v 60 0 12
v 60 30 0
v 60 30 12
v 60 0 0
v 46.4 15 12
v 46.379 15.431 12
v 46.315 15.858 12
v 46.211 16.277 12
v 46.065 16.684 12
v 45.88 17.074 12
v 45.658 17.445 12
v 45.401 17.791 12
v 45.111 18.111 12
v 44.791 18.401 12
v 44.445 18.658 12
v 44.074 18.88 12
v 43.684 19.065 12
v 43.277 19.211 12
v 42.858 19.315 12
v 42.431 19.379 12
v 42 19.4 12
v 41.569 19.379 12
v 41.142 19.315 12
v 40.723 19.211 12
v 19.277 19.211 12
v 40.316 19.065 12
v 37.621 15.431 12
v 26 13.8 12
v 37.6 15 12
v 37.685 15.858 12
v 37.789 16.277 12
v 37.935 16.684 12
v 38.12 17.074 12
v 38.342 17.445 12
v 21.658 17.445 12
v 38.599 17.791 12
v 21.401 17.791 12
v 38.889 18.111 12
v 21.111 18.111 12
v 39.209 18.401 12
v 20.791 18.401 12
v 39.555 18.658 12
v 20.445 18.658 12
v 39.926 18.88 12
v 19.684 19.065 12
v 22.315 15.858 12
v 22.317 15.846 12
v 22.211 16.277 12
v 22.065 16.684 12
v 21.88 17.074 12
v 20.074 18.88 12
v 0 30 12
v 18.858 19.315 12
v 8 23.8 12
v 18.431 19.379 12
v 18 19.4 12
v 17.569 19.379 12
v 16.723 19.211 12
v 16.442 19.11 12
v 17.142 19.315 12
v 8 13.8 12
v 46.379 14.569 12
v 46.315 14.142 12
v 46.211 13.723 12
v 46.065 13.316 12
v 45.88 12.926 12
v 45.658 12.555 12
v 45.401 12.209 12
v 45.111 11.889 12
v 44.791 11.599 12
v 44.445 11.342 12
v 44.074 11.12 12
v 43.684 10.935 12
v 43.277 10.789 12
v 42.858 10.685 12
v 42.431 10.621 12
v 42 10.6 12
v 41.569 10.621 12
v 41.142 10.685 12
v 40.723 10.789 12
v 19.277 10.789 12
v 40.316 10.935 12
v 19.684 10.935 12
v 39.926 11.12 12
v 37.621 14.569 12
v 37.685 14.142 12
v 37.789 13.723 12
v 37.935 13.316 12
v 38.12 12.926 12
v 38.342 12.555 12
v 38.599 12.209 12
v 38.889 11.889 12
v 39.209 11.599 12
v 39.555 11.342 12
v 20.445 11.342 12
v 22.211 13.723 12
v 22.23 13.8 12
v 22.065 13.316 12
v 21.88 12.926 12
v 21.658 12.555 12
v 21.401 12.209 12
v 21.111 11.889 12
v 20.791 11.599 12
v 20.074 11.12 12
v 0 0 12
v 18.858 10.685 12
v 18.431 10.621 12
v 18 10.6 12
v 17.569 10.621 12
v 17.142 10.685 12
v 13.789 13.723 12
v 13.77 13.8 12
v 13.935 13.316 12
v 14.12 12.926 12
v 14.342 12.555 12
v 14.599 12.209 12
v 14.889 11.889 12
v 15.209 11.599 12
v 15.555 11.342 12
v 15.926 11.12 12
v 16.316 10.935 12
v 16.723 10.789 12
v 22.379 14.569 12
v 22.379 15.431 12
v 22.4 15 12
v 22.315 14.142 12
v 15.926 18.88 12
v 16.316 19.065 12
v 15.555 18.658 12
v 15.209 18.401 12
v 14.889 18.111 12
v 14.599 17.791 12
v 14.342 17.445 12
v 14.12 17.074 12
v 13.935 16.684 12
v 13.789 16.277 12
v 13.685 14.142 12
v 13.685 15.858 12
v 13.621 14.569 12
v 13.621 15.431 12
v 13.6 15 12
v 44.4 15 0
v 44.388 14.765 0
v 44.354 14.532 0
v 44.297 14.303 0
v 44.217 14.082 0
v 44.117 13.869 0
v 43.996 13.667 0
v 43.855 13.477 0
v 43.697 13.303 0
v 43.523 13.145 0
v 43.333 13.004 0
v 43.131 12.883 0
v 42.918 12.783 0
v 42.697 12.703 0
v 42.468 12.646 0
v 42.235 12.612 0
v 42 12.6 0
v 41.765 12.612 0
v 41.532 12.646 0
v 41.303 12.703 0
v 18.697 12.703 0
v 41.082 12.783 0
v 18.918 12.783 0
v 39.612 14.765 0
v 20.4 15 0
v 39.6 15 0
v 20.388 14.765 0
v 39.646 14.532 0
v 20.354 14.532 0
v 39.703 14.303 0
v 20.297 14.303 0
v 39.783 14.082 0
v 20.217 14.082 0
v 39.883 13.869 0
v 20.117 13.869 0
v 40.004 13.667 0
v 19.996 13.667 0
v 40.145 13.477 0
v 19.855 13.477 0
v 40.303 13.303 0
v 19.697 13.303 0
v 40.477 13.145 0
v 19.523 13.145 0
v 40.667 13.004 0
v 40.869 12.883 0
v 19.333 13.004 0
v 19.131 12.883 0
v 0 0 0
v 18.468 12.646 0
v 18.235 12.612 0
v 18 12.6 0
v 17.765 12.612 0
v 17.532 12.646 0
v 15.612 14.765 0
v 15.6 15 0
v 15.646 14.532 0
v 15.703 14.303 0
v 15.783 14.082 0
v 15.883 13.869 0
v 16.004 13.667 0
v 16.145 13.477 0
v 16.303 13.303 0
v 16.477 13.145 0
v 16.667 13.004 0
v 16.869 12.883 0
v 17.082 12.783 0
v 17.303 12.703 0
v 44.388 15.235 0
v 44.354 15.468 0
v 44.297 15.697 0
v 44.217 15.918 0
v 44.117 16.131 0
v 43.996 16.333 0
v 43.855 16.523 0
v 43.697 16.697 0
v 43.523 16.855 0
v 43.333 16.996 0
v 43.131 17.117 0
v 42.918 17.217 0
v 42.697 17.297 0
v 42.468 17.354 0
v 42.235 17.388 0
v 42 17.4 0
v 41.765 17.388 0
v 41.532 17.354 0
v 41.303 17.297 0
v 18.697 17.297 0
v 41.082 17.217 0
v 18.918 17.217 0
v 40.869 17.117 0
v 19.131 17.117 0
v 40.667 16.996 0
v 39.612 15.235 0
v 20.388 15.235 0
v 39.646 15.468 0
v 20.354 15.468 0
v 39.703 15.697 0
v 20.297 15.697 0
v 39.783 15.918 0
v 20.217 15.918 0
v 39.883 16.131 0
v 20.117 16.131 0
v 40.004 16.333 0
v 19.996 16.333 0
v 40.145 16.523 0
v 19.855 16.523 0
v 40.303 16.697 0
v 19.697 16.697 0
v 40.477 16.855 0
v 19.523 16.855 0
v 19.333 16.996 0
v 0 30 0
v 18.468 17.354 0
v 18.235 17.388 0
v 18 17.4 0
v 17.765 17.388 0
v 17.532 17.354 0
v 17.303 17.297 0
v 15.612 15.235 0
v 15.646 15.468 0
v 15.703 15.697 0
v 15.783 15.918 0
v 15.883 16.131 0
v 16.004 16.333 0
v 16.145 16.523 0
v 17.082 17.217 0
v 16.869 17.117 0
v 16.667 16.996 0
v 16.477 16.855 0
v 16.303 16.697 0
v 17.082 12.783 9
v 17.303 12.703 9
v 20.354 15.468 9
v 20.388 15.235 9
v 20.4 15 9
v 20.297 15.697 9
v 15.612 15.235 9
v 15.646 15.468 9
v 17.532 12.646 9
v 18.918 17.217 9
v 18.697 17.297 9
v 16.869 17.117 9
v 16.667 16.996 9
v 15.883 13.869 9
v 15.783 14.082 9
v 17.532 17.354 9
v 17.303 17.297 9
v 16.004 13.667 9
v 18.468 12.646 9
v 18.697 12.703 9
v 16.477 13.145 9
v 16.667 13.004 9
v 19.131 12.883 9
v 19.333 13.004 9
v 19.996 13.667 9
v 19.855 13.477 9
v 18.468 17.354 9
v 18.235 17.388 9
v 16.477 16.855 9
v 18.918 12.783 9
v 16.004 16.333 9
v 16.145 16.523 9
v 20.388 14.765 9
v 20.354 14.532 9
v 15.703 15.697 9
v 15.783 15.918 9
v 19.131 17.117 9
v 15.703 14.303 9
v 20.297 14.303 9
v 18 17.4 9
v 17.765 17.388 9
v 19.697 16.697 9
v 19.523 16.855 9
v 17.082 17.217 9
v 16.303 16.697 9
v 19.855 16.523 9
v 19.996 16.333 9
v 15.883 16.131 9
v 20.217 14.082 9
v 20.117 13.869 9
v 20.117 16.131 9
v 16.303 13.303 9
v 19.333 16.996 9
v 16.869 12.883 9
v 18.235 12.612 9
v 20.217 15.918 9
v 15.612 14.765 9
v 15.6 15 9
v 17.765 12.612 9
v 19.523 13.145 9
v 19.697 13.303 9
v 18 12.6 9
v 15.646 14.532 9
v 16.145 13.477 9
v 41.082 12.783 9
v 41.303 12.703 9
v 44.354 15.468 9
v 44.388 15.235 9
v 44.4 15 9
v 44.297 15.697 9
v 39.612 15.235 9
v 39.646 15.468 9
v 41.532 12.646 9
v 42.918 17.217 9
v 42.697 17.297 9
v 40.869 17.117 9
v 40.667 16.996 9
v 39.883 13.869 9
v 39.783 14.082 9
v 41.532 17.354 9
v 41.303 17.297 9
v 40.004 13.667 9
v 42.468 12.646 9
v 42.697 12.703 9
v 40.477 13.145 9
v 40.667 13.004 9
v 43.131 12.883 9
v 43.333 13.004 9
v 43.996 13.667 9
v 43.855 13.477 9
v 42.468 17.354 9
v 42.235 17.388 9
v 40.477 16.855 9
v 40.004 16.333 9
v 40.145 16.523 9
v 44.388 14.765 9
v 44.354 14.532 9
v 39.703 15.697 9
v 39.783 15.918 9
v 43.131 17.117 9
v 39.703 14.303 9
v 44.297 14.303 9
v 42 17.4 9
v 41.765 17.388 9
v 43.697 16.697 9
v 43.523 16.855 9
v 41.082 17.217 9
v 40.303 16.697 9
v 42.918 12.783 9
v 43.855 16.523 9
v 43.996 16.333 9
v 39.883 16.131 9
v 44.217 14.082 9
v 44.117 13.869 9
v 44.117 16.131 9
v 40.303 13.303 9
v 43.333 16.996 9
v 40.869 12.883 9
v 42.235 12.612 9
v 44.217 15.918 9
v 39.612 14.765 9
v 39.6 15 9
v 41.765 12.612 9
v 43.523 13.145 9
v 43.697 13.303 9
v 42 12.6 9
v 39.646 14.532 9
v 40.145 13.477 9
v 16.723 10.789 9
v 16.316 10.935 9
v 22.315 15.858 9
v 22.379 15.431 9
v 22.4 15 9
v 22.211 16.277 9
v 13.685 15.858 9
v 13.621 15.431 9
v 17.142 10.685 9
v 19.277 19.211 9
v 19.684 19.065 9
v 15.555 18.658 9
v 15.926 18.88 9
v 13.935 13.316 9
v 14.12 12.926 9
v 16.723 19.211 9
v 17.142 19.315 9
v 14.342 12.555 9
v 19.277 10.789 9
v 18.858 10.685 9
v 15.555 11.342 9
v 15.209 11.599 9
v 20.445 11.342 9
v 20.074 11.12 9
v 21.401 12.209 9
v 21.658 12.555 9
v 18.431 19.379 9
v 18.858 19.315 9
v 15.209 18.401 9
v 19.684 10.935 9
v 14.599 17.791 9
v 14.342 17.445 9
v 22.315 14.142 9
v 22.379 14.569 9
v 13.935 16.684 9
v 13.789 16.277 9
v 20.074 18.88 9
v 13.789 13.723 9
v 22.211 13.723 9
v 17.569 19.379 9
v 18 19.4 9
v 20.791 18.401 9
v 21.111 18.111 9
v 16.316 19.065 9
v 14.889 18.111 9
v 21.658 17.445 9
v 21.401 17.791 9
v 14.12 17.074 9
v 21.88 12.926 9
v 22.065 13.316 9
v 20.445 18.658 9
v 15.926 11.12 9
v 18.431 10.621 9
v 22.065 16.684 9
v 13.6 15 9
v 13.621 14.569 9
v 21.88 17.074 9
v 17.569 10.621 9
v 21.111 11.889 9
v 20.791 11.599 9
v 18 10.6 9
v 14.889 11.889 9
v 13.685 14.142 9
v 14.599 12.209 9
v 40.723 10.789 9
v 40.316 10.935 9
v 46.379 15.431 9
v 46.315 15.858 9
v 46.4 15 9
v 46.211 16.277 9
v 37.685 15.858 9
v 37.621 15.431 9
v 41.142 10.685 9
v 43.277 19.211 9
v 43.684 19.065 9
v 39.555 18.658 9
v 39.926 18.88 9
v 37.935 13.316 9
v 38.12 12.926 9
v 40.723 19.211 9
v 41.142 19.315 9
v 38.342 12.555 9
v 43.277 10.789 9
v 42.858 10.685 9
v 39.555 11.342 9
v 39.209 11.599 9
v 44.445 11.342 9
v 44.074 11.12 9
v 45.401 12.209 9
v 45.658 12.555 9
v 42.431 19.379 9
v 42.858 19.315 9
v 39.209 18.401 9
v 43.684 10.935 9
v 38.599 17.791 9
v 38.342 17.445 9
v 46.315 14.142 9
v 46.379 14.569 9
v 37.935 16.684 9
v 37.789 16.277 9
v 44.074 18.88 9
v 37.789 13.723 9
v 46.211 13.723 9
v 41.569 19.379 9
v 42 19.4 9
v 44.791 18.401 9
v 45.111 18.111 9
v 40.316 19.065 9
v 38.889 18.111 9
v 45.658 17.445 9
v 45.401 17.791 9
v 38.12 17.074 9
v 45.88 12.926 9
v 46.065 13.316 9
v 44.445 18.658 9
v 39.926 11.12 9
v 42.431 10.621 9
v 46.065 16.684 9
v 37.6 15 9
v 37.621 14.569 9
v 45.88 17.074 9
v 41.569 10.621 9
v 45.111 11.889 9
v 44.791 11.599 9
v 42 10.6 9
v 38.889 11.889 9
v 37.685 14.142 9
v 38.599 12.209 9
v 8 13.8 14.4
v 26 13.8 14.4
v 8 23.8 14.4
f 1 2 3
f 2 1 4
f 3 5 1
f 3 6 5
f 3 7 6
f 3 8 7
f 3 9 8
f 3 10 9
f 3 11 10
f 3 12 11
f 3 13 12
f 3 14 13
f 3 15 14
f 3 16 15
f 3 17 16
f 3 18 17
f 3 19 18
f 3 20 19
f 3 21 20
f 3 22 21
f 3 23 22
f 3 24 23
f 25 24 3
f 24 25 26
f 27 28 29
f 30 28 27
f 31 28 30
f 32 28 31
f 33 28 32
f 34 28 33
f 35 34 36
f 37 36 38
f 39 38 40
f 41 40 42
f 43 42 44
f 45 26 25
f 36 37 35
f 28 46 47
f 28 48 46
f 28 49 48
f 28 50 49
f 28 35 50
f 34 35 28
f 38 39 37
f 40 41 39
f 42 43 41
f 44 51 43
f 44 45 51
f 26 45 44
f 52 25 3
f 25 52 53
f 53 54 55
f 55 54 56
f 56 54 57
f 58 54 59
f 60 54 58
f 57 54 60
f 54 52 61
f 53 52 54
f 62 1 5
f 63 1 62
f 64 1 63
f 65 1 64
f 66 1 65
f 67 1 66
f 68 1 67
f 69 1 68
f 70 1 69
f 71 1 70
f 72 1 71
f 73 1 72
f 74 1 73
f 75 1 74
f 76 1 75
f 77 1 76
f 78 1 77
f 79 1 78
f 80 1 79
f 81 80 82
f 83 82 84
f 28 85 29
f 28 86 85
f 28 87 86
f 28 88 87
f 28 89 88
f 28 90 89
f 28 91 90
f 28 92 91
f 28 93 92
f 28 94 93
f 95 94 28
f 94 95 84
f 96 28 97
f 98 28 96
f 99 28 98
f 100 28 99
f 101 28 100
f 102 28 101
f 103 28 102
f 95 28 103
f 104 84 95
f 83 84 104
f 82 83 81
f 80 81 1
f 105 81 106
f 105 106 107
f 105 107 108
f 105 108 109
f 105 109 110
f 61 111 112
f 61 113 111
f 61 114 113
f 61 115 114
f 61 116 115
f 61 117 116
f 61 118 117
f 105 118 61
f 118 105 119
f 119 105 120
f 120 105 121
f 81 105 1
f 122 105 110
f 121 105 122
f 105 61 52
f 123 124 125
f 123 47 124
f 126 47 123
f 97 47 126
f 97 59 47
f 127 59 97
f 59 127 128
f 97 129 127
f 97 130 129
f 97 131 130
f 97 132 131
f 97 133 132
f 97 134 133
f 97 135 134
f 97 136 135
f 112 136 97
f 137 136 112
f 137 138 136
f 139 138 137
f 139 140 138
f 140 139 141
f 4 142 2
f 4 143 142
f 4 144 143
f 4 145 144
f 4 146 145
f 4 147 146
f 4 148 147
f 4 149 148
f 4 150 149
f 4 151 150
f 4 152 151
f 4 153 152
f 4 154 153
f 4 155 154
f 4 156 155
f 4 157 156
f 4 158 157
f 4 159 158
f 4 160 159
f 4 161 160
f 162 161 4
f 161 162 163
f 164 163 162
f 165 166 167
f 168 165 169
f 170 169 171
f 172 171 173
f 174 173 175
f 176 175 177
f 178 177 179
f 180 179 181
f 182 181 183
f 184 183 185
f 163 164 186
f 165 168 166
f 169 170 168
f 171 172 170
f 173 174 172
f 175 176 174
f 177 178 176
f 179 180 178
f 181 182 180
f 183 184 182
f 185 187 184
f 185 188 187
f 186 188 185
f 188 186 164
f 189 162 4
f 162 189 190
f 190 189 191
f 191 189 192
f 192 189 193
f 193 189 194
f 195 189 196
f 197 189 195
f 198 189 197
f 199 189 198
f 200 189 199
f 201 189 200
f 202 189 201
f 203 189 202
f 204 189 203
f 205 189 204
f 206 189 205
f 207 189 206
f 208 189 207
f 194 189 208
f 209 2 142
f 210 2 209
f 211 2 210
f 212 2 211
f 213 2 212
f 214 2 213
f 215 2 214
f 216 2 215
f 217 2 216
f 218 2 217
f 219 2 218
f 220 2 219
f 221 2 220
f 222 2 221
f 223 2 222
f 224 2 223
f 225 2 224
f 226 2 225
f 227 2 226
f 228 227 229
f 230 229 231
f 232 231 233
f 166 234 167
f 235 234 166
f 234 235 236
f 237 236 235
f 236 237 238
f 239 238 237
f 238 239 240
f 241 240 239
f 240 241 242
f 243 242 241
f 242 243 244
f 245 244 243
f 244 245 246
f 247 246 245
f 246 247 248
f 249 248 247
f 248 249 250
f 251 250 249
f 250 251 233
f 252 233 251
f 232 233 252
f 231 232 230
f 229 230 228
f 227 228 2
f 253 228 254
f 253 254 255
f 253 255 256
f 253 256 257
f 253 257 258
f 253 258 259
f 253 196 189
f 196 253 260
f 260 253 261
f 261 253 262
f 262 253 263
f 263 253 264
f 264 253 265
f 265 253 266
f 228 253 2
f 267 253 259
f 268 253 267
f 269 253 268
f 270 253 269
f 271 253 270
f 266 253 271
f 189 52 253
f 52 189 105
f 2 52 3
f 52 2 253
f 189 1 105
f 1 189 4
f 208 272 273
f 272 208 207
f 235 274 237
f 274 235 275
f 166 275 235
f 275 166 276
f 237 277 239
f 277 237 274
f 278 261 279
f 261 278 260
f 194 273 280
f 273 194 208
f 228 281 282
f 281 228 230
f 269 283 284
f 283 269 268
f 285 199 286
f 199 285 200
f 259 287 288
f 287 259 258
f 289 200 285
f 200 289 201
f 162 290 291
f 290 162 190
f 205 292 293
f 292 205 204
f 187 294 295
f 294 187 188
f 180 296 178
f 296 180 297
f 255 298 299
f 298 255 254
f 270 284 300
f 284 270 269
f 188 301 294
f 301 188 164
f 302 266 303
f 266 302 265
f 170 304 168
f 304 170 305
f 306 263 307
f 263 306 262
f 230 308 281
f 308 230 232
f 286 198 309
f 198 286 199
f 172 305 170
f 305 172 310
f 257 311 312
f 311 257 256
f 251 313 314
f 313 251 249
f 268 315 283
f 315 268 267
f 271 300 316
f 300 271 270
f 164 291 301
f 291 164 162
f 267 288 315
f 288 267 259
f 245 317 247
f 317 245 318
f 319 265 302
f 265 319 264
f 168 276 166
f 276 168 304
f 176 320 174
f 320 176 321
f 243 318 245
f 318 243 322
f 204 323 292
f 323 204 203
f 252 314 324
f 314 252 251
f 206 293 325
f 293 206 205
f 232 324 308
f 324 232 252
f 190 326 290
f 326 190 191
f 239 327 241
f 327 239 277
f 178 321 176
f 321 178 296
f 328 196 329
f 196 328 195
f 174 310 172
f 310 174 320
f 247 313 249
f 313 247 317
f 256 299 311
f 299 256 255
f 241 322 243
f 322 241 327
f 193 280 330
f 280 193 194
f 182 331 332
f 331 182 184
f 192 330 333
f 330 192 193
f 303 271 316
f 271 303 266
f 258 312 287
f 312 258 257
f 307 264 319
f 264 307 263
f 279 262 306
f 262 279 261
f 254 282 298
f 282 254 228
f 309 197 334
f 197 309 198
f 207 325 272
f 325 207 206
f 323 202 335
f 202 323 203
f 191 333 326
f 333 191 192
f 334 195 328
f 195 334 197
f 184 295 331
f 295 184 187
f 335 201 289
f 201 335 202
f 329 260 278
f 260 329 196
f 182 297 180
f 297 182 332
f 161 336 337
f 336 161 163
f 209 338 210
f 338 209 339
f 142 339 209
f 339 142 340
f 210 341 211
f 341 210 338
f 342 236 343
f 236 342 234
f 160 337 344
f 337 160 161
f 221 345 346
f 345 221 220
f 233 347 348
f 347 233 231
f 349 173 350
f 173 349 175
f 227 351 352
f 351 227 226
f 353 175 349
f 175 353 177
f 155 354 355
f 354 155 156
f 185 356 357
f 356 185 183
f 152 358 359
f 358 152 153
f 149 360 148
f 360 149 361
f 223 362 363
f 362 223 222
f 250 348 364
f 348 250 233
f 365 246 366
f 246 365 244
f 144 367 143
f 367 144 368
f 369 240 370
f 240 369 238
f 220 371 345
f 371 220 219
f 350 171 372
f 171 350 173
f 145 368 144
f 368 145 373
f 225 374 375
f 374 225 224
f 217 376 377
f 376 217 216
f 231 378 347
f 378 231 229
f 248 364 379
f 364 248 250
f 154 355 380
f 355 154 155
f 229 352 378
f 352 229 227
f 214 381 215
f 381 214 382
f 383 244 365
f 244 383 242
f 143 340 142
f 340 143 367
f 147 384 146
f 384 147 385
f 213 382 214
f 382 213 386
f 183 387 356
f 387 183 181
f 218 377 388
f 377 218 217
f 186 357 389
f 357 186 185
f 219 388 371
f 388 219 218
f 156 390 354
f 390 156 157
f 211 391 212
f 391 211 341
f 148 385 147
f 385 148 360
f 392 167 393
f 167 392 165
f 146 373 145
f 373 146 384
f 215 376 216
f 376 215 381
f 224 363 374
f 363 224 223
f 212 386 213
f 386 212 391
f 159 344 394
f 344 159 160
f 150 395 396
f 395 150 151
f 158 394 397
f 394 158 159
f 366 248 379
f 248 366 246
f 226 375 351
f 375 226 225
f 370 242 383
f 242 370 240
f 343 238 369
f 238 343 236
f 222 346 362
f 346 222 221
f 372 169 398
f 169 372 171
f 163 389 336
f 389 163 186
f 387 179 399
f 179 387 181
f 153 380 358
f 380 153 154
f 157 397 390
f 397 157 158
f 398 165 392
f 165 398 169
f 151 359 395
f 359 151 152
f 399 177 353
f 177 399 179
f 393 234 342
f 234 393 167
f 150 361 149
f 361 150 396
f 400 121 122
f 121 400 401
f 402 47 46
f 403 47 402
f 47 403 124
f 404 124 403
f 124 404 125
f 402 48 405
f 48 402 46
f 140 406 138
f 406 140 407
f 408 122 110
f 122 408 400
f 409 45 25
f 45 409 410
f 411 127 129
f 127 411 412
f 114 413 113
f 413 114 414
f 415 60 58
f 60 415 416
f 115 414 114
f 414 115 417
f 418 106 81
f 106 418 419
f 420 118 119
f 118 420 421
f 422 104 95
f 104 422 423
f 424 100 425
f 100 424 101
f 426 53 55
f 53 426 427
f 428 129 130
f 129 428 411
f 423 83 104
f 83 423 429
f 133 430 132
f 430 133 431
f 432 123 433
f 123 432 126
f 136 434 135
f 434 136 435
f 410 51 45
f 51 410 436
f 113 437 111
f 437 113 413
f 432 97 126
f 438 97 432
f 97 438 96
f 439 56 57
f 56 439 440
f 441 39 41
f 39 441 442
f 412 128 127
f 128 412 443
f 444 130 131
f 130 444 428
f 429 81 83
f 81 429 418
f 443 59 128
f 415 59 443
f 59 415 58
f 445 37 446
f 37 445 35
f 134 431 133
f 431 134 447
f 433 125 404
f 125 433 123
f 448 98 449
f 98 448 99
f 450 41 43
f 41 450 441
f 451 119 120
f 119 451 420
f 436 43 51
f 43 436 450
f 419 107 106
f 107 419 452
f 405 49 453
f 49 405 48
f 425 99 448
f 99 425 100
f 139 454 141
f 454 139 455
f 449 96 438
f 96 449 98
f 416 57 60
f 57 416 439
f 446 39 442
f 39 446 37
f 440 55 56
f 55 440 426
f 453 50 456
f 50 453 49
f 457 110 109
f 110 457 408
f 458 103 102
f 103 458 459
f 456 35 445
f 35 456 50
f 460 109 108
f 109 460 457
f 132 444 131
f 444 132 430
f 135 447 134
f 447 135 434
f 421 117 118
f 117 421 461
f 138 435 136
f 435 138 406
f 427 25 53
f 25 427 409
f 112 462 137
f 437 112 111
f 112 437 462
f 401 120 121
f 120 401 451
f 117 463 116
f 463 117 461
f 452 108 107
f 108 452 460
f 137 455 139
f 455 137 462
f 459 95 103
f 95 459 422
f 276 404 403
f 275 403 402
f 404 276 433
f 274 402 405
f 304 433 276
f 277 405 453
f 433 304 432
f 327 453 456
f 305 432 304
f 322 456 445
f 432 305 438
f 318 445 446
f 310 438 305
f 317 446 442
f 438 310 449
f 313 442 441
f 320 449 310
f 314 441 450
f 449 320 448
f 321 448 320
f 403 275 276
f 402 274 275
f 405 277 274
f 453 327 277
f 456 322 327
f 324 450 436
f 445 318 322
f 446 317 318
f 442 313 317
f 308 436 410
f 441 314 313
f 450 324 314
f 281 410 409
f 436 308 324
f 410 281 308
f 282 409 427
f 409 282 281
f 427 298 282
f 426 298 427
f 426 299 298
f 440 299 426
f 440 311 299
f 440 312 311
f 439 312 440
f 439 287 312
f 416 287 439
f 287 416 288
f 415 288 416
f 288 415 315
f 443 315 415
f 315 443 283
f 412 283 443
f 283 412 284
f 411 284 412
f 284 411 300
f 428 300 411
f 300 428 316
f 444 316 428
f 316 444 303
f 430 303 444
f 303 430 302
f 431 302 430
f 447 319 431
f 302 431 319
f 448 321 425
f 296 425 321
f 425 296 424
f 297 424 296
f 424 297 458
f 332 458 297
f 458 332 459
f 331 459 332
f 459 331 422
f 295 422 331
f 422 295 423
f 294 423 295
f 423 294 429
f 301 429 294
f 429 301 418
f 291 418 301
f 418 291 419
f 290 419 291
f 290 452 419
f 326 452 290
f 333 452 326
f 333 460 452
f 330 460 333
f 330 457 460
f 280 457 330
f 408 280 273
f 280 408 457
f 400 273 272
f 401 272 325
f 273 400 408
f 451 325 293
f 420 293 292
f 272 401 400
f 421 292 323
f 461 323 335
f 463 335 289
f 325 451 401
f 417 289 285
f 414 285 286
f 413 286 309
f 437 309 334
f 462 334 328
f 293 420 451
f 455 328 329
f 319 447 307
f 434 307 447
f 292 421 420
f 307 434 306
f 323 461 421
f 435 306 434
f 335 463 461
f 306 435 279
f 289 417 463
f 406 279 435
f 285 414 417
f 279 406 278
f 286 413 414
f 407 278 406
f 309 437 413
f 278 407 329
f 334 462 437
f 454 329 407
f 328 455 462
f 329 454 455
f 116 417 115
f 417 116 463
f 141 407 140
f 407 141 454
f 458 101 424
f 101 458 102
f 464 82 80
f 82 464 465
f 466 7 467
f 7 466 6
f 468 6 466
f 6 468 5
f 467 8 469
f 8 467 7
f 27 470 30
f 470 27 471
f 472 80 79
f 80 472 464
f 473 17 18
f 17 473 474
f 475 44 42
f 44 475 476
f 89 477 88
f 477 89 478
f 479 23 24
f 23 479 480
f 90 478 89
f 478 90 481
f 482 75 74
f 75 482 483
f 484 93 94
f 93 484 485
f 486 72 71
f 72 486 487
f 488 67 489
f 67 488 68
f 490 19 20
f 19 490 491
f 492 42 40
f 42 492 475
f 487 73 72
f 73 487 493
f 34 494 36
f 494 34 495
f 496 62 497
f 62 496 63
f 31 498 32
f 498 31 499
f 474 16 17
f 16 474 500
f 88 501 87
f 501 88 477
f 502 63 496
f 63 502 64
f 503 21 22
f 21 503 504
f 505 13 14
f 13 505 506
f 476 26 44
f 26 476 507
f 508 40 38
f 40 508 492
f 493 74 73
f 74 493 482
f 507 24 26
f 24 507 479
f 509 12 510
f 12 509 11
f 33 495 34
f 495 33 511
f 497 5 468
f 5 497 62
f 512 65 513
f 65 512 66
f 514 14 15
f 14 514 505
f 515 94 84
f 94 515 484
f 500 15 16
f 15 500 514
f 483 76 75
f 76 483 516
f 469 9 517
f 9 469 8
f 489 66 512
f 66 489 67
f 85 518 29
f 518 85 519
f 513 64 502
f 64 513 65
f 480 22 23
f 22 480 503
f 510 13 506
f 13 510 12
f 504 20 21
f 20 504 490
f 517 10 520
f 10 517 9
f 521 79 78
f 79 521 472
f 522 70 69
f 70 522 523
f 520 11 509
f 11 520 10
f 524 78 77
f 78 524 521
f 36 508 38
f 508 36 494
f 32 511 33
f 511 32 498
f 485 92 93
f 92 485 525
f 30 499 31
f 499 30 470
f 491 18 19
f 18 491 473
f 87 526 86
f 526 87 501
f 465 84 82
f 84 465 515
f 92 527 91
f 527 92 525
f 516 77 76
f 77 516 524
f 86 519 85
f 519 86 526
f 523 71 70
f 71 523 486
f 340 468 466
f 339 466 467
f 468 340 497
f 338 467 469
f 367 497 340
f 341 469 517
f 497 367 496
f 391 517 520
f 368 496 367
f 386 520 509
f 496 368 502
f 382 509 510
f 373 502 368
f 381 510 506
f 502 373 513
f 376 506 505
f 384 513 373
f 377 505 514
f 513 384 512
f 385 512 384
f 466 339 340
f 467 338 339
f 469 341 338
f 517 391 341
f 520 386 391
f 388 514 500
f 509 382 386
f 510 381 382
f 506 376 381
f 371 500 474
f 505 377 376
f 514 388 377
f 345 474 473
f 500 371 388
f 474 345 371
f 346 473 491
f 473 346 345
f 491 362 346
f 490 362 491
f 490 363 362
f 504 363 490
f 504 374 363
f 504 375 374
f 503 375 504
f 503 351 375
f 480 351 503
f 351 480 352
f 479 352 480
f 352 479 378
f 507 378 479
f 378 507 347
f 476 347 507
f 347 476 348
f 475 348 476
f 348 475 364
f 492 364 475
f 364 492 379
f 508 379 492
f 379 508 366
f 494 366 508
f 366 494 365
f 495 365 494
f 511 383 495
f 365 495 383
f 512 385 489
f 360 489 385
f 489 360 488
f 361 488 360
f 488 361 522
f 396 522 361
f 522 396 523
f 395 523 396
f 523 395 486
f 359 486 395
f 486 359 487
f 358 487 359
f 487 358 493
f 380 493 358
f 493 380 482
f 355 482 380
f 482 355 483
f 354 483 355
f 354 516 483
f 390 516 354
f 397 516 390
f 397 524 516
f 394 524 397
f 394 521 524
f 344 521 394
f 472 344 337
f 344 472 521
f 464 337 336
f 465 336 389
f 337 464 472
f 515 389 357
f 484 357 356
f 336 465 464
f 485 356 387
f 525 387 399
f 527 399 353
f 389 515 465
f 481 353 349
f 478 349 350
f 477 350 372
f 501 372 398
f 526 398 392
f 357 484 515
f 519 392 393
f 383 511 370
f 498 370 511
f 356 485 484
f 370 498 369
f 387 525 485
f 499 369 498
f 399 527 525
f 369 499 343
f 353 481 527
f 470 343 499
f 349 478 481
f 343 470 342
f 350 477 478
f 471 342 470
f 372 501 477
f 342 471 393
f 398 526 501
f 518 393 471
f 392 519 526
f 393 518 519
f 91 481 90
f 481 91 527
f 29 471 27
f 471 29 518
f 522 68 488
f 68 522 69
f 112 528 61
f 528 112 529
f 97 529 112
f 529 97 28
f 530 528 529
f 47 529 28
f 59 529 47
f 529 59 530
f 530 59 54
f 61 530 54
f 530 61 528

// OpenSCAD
// project_stem: example_project
// version: v01
// units: millimeters
// orientation: Z+ is up
// printer_name: Bambu Lab P2S
// material: PETG
// print_orientation: largest flat face on bed
// support_notes: update before export
// brim_notes: update before export

$fn = 64;

// -------------------------
// Parameters
// -------------------------
project_stem = "example_project";
version = "v01";
printer_name = "Bambu Lab P2S";
material = "PETG";

clearance_profile = "normal_slip";
loose_clearance = 0.5;
normal_clearance = 0.3;
tight_clearance = 0.15;
fit_clearance = normal_clearance;

part_width = 60;
part_depth = 30;
part_height = 12;
wall_thickness = 3.2;

screw_diameter = 4.5;
screw_head_diameter = 8.5;
screw_head_depth = 3;
use_countersink = false;
use_counterbore = true;

rib_thickness = 2.4;
rib_height = 10;
edge_chamfer = 0.8;

export_part = "main";
split_part = "none"; // none, left, right

// -------------------------
// Helper Modules
// -------------------------
module rounded_box(size_vec, radius = 1) {
    // Simple editable box. Add real fillets only where needed.
    cube(size_vec);
}

module screw_clearance_hole(height) {
    cylinder(h = height, d = screw_diameter + fit_clearance);
}

module screw_head_pocket(depth) {
    if (use_counterbore) {
        cylinder(h = depth, d = screw_head_diameter + fit_clearance);
    } else if (use_countersink) {
        cylinder(h = depth, d1 = screw_head_diameter + fit_clearance, d2 = screw_diameter + fit_clearance);
    }
}

module reinforcement_rib(length) {
    linear_extrude(height = rib_thickness)
        polygon(points = [[0, 0], [length, 0], [0, rib_height]]);
}

// -------------------------
// Body Modules
// -------------------------
module main_body() {
    difference() {
        rounded_box([part_width, part_depth, part_height], edge_chamfer);
        translate([part_width * 0.3, part_depth / 2, -1])
            screw_clearance_hole(part_height + 2);
        translate([part_width * 0.7, part_depth / 2, -1])
            screw_clearance_hole(part_height + 2);
        translate([part_width * 0.3, part_depth / 2, part_height - screw_head_depth])
            screw_head_pocket(screw_head_depth + 1);
        translate([part_width * 0.7, part_depth / 2, part_height - screw_head_depth])
            screw_head_pocket(screw_head_depth + 1);
    }
}

module reinforced_part() {
    union() {
        main_body();
        translate([8, part_depth / 2 - rib_thickness / 2, part_height])
            reinforcement_rib(18);
    }
}

// -------------------------
// Final Render
// -------------------------
module final_render() {
    if (export_part == "main") {
        reinforced_part();
    }
}

final_render();
